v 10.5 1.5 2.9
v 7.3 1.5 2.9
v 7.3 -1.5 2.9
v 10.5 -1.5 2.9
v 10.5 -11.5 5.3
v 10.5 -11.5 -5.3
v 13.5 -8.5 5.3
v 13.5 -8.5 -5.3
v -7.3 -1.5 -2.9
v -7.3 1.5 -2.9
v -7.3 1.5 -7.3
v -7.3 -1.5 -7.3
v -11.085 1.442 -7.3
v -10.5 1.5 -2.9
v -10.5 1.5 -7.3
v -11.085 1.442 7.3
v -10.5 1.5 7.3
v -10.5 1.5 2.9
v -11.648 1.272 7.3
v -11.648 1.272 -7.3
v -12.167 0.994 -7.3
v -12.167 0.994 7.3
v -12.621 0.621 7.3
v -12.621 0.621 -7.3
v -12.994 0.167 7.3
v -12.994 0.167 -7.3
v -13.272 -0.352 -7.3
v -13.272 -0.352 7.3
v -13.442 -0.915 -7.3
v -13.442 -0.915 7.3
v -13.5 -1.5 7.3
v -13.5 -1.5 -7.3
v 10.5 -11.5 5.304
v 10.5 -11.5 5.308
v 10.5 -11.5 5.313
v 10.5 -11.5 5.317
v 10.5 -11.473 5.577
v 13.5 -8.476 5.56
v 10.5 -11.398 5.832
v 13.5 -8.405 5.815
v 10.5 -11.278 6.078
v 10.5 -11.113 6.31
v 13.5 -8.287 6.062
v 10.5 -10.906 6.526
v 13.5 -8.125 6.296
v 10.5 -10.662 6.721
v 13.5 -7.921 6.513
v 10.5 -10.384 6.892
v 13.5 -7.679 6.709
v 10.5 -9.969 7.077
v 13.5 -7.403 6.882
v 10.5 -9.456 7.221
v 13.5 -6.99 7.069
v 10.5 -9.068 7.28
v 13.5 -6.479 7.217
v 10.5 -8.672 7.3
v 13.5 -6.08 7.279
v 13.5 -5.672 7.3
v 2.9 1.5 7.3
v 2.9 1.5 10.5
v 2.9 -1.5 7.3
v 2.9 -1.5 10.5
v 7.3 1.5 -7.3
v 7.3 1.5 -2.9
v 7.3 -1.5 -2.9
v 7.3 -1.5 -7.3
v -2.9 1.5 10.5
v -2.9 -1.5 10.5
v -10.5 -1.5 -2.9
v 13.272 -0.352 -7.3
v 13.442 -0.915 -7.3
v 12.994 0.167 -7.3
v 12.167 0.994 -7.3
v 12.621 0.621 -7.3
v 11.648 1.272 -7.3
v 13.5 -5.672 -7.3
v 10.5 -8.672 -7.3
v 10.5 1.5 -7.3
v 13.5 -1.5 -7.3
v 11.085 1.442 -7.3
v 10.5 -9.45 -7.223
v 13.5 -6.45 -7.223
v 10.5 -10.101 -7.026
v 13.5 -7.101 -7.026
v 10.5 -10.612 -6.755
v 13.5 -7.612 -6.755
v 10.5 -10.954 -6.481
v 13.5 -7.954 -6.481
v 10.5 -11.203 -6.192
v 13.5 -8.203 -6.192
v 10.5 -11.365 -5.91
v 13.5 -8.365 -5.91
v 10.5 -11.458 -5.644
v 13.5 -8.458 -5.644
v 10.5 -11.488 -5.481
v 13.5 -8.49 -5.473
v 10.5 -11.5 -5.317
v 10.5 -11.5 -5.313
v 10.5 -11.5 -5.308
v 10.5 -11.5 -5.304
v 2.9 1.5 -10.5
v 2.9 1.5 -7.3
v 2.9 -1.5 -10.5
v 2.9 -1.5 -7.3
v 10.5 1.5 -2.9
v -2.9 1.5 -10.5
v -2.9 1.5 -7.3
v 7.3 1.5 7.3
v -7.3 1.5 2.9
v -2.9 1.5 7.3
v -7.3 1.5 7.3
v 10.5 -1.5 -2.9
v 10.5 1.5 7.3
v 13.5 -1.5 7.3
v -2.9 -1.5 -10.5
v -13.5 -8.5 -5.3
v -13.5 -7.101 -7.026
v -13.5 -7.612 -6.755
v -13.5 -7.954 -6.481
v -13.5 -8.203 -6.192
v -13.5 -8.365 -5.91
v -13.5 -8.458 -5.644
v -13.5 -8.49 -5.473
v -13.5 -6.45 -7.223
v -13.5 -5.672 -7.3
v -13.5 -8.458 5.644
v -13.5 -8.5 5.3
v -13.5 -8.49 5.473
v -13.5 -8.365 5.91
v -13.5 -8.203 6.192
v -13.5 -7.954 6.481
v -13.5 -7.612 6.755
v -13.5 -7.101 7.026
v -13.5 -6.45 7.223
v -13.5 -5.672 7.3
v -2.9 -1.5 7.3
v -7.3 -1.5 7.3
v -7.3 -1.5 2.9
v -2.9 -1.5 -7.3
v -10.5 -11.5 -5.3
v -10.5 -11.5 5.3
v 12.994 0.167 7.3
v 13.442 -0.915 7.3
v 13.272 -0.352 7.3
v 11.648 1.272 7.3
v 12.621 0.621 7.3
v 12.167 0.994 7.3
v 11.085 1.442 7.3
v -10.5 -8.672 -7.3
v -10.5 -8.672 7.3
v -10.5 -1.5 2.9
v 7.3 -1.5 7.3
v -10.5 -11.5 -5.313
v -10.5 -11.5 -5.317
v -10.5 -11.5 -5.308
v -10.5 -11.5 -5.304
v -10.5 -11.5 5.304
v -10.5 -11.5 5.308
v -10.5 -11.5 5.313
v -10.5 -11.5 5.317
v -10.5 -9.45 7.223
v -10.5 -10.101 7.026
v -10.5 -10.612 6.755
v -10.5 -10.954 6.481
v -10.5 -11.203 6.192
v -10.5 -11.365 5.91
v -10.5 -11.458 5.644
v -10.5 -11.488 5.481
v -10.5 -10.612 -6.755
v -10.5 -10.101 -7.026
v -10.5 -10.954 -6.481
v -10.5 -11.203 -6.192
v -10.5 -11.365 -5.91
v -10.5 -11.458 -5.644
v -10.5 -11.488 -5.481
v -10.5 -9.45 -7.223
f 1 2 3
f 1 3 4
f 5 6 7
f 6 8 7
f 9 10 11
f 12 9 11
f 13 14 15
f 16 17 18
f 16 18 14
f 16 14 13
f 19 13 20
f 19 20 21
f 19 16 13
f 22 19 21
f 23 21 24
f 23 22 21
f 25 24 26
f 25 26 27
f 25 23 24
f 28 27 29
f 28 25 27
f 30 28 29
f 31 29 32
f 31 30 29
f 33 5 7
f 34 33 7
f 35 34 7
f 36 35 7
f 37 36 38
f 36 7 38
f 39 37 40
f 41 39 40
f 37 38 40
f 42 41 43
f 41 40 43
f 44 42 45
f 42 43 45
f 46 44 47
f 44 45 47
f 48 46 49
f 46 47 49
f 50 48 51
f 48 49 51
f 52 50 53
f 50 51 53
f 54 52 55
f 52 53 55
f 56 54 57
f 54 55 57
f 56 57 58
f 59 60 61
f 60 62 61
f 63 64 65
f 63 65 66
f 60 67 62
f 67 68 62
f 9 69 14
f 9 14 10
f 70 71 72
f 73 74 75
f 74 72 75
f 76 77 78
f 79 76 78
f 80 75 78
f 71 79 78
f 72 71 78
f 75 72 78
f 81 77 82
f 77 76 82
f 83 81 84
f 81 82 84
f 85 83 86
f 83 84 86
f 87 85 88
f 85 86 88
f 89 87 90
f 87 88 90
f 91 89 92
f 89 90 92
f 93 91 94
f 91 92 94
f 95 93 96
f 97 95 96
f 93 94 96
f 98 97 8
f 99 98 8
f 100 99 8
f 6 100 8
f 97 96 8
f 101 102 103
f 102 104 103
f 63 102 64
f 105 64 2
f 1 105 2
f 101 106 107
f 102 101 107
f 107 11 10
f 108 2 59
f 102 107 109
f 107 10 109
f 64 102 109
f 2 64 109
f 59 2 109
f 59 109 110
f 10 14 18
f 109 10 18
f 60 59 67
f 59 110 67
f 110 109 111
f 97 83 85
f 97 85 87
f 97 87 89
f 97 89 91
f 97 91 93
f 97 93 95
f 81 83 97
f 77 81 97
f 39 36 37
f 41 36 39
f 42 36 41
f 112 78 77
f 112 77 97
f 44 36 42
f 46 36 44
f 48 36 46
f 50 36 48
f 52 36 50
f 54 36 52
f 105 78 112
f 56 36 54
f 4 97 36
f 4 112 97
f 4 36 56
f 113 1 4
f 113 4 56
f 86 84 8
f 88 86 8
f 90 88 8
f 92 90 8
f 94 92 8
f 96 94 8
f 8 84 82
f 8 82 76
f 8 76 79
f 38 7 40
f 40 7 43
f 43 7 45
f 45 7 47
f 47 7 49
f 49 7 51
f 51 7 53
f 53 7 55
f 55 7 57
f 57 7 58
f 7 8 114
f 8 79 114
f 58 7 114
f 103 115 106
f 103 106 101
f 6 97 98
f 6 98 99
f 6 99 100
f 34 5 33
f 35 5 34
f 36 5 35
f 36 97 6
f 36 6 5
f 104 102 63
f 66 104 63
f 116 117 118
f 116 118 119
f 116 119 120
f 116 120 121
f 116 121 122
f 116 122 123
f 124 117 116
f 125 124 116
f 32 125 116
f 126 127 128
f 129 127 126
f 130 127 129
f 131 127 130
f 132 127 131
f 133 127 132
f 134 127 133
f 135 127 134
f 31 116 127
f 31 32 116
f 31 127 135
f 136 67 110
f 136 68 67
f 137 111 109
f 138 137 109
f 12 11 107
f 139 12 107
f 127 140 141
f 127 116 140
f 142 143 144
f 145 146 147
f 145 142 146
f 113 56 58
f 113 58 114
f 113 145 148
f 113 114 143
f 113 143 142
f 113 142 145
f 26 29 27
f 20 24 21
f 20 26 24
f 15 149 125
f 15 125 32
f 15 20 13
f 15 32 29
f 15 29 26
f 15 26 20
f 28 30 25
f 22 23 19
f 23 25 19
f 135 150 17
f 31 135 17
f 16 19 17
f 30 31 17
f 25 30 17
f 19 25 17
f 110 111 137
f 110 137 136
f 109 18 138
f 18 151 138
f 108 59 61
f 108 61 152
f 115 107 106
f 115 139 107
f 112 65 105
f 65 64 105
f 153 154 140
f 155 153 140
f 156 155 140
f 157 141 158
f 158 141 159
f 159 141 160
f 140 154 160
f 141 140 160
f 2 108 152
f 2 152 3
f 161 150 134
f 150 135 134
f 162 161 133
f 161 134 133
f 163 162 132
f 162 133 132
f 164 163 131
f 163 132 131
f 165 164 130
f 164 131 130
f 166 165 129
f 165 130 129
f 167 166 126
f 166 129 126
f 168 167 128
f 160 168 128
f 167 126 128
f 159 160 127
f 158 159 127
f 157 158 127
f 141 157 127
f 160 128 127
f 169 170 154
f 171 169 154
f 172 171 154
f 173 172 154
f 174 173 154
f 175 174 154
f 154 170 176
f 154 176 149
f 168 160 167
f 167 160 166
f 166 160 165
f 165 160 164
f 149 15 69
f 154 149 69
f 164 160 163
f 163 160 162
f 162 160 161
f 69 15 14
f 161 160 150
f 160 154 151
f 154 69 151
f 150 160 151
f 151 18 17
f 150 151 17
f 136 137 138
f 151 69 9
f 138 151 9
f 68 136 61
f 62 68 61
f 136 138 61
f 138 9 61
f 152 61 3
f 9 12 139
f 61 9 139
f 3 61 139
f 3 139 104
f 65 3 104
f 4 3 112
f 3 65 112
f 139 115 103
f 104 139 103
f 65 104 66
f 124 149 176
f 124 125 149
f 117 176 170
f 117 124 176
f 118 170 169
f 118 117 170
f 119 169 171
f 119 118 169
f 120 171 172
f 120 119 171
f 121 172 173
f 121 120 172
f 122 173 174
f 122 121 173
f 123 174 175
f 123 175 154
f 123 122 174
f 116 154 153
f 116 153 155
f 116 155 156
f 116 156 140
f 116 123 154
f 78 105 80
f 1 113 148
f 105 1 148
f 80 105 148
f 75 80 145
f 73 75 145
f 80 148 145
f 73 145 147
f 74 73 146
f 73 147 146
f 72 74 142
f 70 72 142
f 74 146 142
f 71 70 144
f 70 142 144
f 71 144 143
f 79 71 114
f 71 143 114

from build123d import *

# Parameters (mm, degrees)
SKETCH1_W           = 14.6
SKETCH1_H           = 14.6
BOSS_EXTRUDE1_DEPTH = 1.5
SKETCH2_W           = 5.8
SKETCH2_H           = 3.2
SKETCH2_W_2         = 3.2
SKETCH2_H_2         = 5.8
BOSS_EXTRUDE2_DEPTH = 1.5
SKETCH4_W           = 14.6
SKETCH4_H           = 13
BOSS_EXTRUDE3_DEPTH = 3
FILLET5_R           = 3
CHAMFER1_SIZE       = 3
FILLET4_R           = 2


with BuildPart() as part:
    # Sketch1 → Boss-Extrude1 (new, symmetric)
    with BuildSketch(Plane(origin=(0, 0, 0), x_dir=(1, 0, 0), z_dir=(0, 1, 0))):
        Rectangle(SKETCH1_W, SKETCH1_H)
    extrude(amount=BOSS_EXTRUDE1_DEPTH, both=True)

    # Sketch2 → Boss-Extrude2 (add, symmetric)
    with BuildSketch(Plane(origin=(0, 0, 0), x_dir=(1, 0, 0), z_dir=(0, 1, 0))):
        with Locations((0, 8.9)):
            Rectangle(SKETCH2_W, SKETCH2_H)
        with Locations((0, -8.9)):
            Rectangle(SKETCH2_W, SKETCH2_H)
        with Locations((-8.9, 0)):
            Rectangle(SKETCH2_W_2, SKETCH2_H_2)
        with Locations((8.9, 0)):
            Rectangle(SKETCH2_W_2, SKETCH2_H_2)
    extrude(amount=BOSS_EXTRUDE2_DEPTH, both=True)

    # Sketch4 → Boss-Extrude3 (add)
    with BuildSketch(Plane.ZY.offset(10.5)):
        with Locations((0, -5)):
            Rectangle(SKETCH4_W, SKETCH4_H)
    boss_extrude3 = extrude(amount=BOSS_EXTRUDE3_DEPTH)

    # Mirror1: Boss-Extrude3 across plane
    add(boss_extrude3.mirror(Plane(origin=(0, 0, 0), x_dir=(0, 0, 1), z_dir=(1, 0, 0))))

    # Fillet5
    fillet5_edges = [part.edges().sort_by_distance(p)[0] for p in [
        (-13.5, 1.5, 0),
        (13.5, 1.5, 0),
    ]]
    fillet(fillet5_edges, radius=FILLET5_R)

    # Chamfer1
    chamfer1_edges = [part.edges().sort_by_distance(p)[0] for p in [
        (13.5, -11.5, 0),
        (-13.5, -11.5, 0),
    ]]
    chamfer(chamfer1_edges, length=CHAMFER1_SIZE - 0.0001)  # a hair under: the kernel refuses the full size

    # Fillet4
    fillet4_edges = [part.edges().sort_by_distance(p)[0] for p in [
        (-12.00005, -10.00005, 7.3),
        (-12.00005, -10.00005, -7.3),
        (12.00005, -10.00005, 7.3),
        (12.00005, -10.00005, -7.3),
    ]]
    fillet(fillet4_edges, radius=FILLET4_R)


solid = part.part
